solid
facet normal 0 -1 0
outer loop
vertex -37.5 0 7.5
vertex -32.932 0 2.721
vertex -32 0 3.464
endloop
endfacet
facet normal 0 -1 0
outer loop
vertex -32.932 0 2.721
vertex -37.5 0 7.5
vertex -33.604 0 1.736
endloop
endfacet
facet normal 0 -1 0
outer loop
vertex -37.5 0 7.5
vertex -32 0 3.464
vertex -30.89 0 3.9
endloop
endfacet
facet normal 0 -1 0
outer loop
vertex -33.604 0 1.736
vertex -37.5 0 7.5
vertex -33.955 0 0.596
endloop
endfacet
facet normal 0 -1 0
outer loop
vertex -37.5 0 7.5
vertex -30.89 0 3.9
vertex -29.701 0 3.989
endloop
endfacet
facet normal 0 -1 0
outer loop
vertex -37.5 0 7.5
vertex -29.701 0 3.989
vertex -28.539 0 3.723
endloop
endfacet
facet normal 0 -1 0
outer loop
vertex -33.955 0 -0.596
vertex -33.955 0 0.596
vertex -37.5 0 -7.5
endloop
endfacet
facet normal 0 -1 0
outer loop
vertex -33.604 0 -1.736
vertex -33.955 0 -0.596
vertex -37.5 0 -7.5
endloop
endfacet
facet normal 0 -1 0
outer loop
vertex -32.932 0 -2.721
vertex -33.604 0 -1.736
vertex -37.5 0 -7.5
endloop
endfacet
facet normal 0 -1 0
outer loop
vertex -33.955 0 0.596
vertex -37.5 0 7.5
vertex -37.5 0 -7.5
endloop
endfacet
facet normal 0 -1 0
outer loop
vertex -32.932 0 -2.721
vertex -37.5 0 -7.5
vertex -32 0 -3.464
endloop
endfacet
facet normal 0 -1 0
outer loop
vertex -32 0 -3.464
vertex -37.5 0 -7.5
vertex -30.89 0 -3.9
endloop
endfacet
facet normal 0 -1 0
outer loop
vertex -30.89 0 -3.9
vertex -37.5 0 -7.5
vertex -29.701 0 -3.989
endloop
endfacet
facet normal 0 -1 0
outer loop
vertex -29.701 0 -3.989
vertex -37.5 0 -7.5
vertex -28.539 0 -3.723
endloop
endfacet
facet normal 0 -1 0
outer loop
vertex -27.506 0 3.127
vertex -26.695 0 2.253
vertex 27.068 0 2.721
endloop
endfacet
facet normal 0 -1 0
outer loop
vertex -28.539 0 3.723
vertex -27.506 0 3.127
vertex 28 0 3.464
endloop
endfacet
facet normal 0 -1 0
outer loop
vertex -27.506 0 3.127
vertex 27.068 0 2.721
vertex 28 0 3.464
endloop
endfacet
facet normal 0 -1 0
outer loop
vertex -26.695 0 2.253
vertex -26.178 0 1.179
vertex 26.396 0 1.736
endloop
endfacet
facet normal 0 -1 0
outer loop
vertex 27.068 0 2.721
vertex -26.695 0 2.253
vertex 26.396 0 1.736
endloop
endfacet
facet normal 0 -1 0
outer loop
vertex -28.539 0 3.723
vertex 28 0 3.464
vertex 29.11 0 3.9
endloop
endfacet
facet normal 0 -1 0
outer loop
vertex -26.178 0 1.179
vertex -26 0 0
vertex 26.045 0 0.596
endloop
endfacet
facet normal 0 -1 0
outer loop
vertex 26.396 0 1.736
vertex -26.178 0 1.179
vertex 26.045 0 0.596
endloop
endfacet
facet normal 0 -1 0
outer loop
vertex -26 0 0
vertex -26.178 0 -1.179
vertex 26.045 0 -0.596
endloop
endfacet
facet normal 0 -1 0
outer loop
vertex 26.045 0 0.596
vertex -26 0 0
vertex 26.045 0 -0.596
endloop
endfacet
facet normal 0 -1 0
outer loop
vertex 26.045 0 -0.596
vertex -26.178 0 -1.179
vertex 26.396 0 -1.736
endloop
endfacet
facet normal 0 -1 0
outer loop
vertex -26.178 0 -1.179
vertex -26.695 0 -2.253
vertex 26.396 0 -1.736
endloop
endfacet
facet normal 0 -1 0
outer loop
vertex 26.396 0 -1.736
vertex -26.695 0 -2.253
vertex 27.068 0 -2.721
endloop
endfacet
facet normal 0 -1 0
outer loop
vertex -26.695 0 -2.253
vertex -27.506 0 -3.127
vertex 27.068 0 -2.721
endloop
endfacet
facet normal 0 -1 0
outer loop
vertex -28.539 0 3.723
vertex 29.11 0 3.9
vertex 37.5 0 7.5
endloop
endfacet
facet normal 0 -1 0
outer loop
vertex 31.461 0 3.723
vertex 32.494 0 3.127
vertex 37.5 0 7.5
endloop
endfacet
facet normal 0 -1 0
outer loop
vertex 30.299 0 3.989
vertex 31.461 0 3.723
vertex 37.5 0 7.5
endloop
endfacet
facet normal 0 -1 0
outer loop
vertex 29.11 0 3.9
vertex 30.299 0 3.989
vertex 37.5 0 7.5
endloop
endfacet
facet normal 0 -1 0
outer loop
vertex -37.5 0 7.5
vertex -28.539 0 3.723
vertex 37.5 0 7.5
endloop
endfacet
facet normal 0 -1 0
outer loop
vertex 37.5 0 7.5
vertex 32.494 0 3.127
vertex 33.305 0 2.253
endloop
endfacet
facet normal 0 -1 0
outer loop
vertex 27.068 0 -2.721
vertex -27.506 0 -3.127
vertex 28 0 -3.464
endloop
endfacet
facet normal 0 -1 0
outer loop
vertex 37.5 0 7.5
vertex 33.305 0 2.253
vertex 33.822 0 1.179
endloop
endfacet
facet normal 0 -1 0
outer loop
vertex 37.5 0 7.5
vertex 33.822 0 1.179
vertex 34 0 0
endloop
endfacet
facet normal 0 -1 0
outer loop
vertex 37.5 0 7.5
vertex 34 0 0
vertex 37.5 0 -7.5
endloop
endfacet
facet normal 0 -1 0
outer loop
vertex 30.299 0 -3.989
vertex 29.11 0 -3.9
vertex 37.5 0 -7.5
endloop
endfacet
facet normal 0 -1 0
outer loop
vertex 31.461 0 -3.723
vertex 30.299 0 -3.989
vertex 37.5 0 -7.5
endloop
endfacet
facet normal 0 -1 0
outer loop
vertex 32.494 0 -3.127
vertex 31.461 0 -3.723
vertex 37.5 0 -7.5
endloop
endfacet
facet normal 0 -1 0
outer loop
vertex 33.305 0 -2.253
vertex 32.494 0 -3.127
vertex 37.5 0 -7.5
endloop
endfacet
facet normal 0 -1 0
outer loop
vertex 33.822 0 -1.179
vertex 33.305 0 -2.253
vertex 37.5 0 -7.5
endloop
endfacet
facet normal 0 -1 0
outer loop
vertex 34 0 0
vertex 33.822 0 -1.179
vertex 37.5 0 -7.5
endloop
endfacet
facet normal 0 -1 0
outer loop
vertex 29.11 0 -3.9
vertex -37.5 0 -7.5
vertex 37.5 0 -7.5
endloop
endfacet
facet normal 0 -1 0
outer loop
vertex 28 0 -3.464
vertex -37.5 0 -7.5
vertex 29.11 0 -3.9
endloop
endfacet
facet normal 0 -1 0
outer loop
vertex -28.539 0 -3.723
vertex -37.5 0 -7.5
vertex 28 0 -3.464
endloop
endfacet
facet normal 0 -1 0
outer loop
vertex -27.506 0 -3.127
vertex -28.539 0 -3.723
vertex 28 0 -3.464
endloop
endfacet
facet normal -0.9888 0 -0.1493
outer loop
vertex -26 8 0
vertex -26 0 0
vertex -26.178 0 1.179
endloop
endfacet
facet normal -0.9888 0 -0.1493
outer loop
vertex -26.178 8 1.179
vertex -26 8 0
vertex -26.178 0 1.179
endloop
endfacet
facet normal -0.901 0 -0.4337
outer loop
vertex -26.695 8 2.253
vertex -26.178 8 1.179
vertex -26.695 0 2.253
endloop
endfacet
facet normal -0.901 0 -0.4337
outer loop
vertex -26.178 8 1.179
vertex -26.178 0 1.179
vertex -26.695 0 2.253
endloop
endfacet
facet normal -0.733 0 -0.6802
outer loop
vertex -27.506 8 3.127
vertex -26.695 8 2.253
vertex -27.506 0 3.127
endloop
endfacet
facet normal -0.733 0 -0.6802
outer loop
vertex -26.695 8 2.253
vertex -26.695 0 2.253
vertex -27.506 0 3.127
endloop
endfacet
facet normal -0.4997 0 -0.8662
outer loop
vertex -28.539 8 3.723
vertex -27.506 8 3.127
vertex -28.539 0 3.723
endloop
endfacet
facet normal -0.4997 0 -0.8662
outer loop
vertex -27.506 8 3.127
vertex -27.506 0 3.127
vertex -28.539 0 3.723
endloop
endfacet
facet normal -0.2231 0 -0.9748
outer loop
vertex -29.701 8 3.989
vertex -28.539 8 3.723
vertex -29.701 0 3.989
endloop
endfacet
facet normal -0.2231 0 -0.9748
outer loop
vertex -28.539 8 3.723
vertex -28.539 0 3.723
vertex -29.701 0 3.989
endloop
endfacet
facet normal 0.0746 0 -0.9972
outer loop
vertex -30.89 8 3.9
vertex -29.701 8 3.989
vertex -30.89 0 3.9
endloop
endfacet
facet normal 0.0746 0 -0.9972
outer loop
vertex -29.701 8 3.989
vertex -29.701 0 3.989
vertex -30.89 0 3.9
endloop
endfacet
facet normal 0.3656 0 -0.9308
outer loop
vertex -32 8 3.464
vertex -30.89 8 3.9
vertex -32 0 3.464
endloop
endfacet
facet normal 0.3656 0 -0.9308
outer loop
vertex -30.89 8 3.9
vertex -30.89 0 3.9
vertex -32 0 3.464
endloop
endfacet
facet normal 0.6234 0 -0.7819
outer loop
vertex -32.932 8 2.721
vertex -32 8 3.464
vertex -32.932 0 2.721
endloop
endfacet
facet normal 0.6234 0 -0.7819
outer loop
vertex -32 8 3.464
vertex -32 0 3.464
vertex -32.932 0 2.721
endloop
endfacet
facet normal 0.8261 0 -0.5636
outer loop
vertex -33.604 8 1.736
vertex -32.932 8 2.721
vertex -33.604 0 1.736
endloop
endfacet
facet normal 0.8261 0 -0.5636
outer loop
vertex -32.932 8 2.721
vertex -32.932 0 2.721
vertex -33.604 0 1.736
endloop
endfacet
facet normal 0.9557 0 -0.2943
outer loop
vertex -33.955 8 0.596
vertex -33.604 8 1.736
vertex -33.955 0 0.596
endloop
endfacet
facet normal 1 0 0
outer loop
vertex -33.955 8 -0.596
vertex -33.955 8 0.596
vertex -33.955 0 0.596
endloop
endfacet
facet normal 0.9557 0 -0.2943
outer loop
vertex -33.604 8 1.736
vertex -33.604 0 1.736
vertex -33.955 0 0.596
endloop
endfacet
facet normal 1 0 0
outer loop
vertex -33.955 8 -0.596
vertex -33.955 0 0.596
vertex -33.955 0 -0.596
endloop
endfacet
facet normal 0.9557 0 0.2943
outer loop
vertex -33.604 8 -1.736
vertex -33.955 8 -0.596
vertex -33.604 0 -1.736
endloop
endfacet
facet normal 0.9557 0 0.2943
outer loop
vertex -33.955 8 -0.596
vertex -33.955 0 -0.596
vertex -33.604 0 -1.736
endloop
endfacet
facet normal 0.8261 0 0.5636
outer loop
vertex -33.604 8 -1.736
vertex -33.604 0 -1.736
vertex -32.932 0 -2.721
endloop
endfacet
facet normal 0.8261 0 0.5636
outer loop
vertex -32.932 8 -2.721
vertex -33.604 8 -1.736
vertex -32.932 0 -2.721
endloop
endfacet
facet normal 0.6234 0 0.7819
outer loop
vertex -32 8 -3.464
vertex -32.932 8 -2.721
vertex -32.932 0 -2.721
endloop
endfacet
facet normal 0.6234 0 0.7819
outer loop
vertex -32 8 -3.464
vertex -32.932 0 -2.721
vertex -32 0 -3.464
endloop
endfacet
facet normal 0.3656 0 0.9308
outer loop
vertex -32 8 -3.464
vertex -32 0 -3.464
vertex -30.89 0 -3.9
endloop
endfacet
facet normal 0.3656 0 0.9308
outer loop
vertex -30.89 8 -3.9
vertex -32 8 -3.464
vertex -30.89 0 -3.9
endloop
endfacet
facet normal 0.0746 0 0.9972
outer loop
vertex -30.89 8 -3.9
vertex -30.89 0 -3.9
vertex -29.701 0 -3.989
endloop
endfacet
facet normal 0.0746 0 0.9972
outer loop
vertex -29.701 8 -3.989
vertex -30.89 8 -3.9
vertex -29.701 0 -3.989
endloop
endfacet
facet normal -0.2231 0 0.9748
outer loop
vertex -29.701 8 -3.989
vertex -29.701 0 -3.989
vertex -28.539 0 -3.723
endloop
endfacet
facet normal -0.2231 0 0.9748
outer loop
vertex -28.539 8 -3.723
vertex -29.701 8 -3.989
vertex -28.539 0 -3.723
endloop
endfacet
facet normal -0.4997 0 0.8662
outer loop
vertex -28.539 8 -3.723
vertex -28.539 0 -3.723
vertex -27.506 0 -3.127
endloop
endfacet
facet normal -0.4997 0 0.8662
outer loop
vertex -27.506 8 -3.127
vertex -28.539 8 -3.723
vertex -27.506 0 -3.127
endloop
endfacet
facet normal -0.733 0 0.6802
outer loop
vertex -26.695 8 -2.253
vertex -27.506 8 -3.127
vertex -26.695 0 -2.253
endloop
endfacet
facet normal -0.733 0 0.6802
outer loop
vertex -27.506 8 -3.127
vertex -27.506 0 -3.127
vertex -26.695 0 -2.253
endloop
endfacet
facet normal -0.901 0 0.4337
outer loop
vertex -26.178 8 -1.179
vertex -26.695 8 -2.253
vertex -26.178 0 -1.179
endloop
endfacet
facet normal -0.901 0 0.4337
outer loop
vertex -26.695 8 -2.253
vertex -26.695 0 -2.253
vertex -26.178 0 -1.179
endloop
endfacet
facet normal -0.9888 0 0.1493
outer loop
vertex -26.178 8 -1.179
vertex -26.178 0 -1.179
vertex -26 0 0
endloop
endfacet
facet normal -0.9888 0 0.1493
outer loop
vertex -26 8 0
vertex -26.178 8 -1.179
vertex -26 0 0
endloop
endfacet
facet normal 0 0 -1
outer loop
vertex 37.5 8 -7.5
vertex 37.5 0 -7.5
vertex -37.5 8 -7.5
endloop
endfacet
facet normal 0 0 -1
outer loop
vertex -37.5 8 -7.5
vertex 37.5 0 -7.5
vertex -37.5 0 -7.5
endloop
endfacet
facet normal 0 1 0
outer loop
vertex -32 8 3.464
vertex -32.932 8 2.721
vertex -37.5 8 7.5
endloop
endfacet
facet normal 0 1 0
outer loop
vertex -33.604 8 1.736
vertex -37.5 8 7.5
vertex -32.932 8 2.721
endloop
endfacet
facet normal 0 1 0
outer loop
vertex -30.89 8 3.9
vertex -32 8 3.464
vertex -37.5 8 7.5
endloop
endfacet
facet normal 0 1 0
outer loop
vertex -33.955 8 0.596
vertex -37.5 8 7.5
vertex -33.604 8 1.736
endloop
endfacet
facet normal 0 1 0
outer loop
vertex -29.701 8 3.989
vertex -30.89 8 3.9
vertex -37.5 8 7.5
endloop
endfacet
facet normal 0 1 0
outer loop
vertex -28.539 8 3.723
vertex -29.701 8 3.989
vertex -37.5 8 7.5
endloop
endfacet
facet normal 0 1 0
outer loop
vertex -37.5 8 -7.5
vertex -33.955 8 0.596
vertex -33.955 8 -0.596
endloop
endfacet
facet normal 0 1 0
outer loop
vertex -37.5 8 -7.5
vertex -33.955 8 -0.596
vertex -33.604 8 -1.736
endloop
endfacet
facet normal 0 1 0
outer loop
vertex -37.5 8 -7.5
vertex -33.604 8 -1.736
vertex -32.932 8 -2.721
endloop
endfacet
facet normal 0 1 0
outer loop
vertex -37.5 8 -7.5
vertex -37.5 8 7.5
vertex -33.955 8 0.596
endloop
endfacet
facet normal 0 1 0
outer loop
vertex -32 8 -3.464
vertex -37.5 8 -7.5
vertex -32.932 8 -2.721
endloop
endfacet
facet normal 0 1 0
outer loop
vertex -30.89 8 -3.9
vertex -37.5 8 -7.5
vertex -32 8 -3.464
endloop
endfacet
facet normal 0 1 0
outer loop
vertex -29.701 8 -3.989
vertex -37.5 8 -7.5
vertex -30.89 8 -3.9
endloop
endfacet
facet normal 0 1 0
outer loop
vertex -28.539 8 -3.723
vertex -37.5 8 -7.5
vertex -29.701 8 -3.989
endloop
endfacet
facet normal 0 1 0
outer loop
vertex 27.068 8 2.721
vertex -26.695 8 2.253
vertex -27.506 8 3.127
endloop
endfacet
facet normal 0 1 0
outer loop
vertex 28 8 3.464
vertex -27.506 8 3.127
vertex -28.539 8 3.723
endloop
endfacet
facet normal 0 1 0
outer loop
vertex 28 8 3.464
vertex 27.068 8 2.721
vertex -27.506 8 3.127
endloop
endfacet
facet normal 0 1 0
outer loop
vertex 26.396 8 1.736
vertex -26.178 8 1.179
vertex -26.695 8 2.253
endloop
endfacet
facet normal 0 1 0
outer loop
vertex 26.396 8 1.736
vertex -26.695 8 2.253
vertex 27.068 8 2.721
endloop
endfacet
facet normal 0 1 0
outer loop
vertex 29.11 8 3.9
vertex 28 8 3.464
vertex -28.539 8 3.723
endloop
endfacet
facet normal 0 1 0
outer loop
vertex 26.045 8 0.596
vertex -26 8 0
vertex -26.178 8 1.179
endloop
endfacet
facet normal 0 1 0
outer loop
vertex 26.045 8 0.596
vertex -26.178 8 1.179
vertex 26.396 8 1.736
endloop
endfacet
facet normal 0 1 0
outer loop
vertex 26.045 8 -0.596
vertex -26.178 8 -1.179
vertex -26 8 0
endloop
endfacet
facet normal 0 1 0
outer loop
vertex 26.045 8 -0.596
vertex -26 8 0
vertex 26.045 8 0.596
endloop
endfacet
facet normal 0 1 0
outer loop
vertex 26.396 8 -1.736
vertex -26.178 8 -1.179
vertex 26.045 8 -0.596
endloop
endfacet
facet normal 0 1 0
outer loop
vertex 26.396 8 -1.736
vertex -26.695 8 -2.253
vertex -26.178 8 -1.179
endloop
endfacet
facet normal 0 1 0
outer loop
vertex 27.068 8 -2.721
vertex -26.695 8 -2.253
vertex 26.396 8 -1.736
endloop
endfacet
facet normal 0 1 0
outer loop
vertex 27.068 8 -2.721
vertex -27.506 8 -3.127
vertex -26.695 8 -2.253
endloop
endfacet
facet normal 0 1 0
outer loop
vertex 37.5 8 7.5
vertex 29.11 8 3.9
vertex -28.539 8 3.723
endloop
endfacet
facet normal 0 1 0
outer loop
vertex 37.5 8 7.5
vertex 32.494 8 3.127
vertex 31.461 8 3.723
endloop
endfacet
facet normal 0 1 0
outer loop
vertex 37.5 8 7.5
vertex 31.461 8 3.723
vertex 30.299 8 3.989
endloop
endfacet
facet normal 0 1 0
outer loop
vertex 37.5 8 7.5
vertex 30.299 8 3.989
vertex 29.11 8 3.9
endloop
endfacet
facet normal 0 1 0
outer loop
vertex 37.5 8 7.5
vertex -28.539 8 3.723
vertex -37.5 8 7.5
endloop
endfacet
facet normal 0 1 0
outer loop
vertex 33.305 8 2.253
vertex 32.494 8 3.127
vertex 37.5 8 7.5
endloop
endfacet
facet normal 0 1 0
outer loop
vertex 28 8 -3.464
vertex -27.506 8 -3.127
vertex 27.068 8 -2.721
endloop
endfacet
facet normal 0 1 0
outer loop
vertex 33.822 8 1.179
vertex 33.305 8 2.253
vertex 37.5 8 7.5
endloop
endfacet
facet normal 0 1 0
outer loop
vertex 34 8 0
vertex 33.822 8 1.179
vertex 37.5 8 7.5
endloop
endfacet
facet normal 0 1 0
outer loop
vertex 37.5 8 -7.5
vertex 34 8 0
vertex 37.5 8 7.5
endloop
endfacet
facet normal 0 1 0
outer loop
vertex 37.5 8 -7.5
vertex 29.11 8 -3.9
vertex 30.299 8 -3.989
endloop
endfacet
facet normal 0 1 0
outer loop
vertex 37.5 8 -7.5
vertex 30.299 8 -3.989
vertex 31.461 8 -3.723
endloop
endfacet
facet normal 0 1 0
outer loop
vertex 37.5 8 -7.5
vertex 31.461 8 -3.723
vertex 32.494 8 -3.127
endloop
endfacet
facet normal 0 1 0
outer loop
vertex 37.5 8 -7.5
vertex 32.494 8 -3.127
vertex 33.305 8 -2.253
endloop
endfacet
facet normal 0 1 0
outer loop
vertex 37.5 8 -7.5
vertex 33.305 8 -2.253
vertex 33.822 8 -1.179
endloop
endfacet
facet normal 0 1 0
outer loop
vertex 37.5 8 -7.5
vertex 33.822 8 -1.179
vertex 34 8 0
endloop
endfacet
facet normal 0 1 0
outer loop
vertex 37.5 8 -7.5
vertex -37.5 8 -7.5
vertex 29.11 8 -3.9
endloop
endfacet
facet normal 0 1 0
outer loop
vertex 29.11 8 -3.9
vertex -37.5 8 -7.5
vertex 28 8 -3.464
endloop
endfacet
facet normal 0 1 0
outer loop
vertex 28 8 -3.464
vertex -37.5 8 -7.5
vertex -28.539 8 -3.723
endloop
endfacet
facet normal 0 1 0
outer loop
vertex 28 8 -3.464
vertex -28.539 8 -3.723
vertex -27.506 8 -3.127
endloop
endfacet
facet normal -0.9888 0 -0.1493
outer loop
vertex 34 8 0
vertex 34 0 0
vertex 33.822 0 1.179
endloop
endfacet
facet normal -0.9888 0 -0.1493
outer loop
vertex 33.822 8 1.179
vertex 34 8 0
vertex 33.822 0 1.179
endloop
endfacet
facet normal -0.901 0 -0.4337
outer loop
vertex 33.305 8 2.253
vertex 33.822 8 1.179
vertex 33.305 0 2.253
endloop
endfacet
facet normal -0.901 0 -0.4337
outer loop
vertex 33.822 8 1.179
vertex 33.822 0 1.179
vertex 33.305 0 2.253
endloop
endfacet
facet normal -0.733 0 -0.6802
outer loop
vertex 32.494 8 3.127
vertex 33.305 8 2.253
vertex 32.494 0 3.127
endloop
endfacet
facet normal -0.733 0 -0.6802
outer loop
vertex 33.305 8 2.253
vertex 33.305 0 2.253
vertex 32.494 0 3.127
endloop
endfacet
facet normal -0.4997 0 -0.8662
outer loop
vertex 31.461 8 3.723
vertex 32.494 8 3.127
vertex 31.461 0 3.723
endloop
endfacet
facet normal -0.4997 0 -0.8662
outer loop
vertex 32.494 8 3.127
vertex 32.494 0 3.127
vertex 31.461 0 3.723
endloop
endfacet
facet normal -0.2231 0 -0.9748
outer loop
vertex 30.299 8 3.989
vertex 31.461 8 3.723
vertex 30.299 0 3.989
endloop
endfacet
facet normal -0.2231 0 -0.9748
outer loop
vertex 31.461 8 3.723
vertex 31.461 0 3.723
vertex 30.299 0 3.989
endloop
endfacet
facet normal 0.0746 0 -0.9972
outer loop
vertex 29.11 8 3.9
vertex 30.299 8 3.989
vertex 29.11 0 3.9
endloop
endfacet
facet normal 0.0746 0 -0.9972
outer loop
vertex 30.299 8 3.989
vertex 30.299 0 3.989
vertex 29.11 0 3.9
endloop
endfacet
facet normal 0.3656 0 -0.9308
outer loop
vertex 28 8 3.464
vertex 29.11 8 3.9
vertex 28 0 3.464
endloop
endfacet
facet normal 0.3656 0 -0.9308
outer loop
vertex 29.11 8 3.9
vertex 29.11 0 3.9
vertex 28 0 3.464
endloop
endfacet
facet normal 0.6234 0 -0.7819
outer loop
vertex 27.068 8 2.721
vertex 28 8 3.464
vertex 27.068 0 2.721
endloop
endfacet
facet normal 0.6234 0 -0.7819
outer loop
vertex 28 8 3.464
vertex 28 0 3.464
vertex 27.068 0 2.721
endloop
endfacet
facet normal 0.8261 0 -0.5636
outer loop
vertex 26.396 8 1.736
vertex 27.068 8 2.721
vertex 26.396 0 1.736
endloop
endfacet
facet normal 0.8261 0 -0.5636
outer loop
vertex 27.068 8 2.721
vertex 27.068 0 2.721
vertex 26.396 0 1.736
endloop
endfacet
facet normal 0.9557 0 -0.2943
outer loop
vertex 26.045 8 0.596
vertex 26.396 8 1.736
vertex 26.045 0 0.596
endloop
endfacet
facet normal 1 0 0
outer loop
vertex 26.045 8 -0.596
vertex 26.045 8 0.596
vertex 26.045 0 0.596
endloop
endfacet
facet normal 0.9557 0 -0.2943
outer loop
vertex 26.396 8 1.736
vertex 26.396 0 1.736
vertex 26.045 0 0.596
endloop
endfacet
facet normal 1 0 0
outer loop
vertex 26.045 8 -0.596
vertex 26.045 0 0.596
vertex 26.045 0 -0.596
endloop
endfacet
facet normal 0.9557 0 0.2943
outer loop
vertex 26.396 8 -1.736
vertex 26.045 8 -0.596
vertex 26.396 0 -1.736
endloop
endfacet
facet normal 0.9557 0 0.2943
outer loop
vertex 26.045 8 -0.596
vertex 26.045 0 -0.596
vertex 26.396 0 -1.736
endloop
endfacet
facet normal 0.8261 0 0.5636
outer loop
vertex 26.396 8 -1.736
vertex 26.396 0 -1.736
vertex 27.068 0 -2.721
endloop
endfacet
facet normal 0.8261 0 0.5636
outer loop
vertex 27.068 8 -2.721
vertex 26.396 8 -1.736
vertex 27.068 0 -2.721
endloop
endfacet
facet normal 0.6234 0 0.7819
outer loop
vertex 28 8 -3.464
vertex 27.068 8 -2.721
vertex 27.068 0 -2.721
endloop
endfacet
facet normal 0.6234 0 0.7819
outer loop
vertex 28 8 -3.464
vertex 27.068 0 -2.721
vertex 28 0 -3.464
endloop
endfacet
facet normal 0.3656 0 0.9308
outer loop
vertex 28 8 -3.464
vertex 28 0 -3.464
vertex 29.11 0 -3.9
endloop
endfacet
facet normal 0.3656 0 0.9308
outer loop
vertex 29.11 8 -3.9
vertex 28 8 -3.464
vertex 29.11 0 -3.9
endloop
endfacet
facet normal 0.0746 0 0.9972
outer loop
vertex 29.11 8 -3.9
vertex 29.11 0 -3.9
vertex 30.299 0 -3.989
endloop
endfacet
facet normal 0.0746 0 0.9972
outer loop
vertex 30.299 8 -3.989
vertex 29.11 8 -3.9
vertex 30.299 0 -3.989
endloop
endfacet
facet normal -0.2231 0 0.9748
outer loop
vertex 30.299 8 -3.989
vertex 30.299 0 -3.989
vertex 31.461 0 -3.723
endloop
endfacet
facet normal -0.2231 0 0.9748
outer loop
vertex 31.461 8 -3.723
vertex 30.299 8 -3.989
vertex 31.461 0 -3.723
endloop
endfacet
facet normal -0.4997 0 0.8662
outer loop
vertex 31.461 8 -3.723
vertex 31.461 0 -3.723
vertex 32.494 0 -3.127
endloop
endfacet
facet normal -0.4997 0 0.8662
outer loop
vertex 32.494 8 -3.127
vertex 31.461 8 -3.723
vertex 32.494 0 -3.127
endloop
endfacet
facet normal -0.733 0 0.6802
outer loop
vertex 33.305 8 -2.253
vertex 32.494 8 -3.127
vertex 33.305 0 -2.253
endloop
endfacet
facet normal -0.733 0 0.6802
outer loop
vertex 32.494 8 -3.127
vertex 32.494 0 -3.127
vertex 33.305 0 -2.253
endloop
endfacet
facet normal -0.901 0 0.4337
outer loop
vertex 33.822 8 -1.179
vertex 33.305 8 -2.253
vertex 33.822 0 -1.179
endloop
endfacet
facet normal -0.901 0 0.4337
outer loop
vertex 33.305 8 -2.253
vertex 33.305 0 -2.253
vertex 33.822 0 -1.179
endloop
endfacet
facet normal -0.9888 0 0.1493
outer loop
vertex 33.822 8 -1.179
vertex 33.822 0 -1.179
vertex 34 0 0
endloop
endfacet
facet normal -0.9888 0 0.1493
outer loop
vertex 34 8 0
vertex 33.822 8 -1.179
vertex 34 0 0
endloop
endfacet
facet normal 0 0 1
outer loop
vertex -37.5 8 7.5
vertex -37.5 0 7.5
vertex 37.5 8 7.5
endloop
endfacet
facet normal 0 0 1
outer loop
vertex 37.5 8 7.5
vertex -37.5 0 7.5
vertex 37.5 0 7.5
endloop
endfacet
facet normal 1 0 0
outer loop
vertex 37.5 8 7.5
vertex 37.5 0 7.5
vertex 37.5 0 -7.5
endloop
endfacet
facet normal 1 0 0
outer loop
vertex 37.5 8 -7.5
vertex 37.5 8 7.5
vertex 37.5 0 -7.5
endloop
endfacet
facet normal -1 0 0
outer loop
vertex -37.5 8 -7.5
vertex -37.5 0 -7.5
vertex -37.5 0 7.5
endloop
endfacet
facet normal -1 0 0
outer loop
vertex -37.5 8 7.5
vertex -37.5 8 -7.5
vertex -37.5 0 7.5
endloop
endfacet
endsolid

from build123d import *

# Parameters (mm, degrees)
BOSS_EXTRUDE1_DEPTH = 8


with BuildPart() as part:
    # Sketch2 → Boss-Extrude1 (new body)
    with BuildSketch(Plane(origin=(0, 0, 0), x_dir=(1, 0, 0), z_dir=(0, 1, 0))):
        with BuildLine():
            ThreePointArc((26, 0), (30, 4), (34, 0))
            Line((34, 0), (37.5, 0))
            Line((37.5, 0), (37.5, 7.5))
            Line((37.5, 7.5), (-37.5, 7.5))
            Line((-37.5, 7.5), (-37.5, 0))
            Line((-37.5, 0), (-34, 0))
            ThreePointArc((-34, 0), (-30, 4), (-26, 0))
            Line((-26, 0), (26, 0))
        make_face()
        with BuildLine():
            Line((37.5, 0), (34, 0))
            ThreePointArc((34, 0), (30, -4), (26, 0))
            Line((26, 0), (-26, 0))
            ThreePointArc((-26, 0), (-30, -4), (-34, 0))
            Line((-34, 0), (-37.5, 0))
            Line((-37.5, 0), (-37.5, -7.5))
            Line((-37.5, -7.5), (37.5, -7.5))
            Line((37.5, -7.5), (37.5, 0))
        make_face()
    extrude(amount=BOSS_EXTRUDE1_DEPTH)


solid = part.part
